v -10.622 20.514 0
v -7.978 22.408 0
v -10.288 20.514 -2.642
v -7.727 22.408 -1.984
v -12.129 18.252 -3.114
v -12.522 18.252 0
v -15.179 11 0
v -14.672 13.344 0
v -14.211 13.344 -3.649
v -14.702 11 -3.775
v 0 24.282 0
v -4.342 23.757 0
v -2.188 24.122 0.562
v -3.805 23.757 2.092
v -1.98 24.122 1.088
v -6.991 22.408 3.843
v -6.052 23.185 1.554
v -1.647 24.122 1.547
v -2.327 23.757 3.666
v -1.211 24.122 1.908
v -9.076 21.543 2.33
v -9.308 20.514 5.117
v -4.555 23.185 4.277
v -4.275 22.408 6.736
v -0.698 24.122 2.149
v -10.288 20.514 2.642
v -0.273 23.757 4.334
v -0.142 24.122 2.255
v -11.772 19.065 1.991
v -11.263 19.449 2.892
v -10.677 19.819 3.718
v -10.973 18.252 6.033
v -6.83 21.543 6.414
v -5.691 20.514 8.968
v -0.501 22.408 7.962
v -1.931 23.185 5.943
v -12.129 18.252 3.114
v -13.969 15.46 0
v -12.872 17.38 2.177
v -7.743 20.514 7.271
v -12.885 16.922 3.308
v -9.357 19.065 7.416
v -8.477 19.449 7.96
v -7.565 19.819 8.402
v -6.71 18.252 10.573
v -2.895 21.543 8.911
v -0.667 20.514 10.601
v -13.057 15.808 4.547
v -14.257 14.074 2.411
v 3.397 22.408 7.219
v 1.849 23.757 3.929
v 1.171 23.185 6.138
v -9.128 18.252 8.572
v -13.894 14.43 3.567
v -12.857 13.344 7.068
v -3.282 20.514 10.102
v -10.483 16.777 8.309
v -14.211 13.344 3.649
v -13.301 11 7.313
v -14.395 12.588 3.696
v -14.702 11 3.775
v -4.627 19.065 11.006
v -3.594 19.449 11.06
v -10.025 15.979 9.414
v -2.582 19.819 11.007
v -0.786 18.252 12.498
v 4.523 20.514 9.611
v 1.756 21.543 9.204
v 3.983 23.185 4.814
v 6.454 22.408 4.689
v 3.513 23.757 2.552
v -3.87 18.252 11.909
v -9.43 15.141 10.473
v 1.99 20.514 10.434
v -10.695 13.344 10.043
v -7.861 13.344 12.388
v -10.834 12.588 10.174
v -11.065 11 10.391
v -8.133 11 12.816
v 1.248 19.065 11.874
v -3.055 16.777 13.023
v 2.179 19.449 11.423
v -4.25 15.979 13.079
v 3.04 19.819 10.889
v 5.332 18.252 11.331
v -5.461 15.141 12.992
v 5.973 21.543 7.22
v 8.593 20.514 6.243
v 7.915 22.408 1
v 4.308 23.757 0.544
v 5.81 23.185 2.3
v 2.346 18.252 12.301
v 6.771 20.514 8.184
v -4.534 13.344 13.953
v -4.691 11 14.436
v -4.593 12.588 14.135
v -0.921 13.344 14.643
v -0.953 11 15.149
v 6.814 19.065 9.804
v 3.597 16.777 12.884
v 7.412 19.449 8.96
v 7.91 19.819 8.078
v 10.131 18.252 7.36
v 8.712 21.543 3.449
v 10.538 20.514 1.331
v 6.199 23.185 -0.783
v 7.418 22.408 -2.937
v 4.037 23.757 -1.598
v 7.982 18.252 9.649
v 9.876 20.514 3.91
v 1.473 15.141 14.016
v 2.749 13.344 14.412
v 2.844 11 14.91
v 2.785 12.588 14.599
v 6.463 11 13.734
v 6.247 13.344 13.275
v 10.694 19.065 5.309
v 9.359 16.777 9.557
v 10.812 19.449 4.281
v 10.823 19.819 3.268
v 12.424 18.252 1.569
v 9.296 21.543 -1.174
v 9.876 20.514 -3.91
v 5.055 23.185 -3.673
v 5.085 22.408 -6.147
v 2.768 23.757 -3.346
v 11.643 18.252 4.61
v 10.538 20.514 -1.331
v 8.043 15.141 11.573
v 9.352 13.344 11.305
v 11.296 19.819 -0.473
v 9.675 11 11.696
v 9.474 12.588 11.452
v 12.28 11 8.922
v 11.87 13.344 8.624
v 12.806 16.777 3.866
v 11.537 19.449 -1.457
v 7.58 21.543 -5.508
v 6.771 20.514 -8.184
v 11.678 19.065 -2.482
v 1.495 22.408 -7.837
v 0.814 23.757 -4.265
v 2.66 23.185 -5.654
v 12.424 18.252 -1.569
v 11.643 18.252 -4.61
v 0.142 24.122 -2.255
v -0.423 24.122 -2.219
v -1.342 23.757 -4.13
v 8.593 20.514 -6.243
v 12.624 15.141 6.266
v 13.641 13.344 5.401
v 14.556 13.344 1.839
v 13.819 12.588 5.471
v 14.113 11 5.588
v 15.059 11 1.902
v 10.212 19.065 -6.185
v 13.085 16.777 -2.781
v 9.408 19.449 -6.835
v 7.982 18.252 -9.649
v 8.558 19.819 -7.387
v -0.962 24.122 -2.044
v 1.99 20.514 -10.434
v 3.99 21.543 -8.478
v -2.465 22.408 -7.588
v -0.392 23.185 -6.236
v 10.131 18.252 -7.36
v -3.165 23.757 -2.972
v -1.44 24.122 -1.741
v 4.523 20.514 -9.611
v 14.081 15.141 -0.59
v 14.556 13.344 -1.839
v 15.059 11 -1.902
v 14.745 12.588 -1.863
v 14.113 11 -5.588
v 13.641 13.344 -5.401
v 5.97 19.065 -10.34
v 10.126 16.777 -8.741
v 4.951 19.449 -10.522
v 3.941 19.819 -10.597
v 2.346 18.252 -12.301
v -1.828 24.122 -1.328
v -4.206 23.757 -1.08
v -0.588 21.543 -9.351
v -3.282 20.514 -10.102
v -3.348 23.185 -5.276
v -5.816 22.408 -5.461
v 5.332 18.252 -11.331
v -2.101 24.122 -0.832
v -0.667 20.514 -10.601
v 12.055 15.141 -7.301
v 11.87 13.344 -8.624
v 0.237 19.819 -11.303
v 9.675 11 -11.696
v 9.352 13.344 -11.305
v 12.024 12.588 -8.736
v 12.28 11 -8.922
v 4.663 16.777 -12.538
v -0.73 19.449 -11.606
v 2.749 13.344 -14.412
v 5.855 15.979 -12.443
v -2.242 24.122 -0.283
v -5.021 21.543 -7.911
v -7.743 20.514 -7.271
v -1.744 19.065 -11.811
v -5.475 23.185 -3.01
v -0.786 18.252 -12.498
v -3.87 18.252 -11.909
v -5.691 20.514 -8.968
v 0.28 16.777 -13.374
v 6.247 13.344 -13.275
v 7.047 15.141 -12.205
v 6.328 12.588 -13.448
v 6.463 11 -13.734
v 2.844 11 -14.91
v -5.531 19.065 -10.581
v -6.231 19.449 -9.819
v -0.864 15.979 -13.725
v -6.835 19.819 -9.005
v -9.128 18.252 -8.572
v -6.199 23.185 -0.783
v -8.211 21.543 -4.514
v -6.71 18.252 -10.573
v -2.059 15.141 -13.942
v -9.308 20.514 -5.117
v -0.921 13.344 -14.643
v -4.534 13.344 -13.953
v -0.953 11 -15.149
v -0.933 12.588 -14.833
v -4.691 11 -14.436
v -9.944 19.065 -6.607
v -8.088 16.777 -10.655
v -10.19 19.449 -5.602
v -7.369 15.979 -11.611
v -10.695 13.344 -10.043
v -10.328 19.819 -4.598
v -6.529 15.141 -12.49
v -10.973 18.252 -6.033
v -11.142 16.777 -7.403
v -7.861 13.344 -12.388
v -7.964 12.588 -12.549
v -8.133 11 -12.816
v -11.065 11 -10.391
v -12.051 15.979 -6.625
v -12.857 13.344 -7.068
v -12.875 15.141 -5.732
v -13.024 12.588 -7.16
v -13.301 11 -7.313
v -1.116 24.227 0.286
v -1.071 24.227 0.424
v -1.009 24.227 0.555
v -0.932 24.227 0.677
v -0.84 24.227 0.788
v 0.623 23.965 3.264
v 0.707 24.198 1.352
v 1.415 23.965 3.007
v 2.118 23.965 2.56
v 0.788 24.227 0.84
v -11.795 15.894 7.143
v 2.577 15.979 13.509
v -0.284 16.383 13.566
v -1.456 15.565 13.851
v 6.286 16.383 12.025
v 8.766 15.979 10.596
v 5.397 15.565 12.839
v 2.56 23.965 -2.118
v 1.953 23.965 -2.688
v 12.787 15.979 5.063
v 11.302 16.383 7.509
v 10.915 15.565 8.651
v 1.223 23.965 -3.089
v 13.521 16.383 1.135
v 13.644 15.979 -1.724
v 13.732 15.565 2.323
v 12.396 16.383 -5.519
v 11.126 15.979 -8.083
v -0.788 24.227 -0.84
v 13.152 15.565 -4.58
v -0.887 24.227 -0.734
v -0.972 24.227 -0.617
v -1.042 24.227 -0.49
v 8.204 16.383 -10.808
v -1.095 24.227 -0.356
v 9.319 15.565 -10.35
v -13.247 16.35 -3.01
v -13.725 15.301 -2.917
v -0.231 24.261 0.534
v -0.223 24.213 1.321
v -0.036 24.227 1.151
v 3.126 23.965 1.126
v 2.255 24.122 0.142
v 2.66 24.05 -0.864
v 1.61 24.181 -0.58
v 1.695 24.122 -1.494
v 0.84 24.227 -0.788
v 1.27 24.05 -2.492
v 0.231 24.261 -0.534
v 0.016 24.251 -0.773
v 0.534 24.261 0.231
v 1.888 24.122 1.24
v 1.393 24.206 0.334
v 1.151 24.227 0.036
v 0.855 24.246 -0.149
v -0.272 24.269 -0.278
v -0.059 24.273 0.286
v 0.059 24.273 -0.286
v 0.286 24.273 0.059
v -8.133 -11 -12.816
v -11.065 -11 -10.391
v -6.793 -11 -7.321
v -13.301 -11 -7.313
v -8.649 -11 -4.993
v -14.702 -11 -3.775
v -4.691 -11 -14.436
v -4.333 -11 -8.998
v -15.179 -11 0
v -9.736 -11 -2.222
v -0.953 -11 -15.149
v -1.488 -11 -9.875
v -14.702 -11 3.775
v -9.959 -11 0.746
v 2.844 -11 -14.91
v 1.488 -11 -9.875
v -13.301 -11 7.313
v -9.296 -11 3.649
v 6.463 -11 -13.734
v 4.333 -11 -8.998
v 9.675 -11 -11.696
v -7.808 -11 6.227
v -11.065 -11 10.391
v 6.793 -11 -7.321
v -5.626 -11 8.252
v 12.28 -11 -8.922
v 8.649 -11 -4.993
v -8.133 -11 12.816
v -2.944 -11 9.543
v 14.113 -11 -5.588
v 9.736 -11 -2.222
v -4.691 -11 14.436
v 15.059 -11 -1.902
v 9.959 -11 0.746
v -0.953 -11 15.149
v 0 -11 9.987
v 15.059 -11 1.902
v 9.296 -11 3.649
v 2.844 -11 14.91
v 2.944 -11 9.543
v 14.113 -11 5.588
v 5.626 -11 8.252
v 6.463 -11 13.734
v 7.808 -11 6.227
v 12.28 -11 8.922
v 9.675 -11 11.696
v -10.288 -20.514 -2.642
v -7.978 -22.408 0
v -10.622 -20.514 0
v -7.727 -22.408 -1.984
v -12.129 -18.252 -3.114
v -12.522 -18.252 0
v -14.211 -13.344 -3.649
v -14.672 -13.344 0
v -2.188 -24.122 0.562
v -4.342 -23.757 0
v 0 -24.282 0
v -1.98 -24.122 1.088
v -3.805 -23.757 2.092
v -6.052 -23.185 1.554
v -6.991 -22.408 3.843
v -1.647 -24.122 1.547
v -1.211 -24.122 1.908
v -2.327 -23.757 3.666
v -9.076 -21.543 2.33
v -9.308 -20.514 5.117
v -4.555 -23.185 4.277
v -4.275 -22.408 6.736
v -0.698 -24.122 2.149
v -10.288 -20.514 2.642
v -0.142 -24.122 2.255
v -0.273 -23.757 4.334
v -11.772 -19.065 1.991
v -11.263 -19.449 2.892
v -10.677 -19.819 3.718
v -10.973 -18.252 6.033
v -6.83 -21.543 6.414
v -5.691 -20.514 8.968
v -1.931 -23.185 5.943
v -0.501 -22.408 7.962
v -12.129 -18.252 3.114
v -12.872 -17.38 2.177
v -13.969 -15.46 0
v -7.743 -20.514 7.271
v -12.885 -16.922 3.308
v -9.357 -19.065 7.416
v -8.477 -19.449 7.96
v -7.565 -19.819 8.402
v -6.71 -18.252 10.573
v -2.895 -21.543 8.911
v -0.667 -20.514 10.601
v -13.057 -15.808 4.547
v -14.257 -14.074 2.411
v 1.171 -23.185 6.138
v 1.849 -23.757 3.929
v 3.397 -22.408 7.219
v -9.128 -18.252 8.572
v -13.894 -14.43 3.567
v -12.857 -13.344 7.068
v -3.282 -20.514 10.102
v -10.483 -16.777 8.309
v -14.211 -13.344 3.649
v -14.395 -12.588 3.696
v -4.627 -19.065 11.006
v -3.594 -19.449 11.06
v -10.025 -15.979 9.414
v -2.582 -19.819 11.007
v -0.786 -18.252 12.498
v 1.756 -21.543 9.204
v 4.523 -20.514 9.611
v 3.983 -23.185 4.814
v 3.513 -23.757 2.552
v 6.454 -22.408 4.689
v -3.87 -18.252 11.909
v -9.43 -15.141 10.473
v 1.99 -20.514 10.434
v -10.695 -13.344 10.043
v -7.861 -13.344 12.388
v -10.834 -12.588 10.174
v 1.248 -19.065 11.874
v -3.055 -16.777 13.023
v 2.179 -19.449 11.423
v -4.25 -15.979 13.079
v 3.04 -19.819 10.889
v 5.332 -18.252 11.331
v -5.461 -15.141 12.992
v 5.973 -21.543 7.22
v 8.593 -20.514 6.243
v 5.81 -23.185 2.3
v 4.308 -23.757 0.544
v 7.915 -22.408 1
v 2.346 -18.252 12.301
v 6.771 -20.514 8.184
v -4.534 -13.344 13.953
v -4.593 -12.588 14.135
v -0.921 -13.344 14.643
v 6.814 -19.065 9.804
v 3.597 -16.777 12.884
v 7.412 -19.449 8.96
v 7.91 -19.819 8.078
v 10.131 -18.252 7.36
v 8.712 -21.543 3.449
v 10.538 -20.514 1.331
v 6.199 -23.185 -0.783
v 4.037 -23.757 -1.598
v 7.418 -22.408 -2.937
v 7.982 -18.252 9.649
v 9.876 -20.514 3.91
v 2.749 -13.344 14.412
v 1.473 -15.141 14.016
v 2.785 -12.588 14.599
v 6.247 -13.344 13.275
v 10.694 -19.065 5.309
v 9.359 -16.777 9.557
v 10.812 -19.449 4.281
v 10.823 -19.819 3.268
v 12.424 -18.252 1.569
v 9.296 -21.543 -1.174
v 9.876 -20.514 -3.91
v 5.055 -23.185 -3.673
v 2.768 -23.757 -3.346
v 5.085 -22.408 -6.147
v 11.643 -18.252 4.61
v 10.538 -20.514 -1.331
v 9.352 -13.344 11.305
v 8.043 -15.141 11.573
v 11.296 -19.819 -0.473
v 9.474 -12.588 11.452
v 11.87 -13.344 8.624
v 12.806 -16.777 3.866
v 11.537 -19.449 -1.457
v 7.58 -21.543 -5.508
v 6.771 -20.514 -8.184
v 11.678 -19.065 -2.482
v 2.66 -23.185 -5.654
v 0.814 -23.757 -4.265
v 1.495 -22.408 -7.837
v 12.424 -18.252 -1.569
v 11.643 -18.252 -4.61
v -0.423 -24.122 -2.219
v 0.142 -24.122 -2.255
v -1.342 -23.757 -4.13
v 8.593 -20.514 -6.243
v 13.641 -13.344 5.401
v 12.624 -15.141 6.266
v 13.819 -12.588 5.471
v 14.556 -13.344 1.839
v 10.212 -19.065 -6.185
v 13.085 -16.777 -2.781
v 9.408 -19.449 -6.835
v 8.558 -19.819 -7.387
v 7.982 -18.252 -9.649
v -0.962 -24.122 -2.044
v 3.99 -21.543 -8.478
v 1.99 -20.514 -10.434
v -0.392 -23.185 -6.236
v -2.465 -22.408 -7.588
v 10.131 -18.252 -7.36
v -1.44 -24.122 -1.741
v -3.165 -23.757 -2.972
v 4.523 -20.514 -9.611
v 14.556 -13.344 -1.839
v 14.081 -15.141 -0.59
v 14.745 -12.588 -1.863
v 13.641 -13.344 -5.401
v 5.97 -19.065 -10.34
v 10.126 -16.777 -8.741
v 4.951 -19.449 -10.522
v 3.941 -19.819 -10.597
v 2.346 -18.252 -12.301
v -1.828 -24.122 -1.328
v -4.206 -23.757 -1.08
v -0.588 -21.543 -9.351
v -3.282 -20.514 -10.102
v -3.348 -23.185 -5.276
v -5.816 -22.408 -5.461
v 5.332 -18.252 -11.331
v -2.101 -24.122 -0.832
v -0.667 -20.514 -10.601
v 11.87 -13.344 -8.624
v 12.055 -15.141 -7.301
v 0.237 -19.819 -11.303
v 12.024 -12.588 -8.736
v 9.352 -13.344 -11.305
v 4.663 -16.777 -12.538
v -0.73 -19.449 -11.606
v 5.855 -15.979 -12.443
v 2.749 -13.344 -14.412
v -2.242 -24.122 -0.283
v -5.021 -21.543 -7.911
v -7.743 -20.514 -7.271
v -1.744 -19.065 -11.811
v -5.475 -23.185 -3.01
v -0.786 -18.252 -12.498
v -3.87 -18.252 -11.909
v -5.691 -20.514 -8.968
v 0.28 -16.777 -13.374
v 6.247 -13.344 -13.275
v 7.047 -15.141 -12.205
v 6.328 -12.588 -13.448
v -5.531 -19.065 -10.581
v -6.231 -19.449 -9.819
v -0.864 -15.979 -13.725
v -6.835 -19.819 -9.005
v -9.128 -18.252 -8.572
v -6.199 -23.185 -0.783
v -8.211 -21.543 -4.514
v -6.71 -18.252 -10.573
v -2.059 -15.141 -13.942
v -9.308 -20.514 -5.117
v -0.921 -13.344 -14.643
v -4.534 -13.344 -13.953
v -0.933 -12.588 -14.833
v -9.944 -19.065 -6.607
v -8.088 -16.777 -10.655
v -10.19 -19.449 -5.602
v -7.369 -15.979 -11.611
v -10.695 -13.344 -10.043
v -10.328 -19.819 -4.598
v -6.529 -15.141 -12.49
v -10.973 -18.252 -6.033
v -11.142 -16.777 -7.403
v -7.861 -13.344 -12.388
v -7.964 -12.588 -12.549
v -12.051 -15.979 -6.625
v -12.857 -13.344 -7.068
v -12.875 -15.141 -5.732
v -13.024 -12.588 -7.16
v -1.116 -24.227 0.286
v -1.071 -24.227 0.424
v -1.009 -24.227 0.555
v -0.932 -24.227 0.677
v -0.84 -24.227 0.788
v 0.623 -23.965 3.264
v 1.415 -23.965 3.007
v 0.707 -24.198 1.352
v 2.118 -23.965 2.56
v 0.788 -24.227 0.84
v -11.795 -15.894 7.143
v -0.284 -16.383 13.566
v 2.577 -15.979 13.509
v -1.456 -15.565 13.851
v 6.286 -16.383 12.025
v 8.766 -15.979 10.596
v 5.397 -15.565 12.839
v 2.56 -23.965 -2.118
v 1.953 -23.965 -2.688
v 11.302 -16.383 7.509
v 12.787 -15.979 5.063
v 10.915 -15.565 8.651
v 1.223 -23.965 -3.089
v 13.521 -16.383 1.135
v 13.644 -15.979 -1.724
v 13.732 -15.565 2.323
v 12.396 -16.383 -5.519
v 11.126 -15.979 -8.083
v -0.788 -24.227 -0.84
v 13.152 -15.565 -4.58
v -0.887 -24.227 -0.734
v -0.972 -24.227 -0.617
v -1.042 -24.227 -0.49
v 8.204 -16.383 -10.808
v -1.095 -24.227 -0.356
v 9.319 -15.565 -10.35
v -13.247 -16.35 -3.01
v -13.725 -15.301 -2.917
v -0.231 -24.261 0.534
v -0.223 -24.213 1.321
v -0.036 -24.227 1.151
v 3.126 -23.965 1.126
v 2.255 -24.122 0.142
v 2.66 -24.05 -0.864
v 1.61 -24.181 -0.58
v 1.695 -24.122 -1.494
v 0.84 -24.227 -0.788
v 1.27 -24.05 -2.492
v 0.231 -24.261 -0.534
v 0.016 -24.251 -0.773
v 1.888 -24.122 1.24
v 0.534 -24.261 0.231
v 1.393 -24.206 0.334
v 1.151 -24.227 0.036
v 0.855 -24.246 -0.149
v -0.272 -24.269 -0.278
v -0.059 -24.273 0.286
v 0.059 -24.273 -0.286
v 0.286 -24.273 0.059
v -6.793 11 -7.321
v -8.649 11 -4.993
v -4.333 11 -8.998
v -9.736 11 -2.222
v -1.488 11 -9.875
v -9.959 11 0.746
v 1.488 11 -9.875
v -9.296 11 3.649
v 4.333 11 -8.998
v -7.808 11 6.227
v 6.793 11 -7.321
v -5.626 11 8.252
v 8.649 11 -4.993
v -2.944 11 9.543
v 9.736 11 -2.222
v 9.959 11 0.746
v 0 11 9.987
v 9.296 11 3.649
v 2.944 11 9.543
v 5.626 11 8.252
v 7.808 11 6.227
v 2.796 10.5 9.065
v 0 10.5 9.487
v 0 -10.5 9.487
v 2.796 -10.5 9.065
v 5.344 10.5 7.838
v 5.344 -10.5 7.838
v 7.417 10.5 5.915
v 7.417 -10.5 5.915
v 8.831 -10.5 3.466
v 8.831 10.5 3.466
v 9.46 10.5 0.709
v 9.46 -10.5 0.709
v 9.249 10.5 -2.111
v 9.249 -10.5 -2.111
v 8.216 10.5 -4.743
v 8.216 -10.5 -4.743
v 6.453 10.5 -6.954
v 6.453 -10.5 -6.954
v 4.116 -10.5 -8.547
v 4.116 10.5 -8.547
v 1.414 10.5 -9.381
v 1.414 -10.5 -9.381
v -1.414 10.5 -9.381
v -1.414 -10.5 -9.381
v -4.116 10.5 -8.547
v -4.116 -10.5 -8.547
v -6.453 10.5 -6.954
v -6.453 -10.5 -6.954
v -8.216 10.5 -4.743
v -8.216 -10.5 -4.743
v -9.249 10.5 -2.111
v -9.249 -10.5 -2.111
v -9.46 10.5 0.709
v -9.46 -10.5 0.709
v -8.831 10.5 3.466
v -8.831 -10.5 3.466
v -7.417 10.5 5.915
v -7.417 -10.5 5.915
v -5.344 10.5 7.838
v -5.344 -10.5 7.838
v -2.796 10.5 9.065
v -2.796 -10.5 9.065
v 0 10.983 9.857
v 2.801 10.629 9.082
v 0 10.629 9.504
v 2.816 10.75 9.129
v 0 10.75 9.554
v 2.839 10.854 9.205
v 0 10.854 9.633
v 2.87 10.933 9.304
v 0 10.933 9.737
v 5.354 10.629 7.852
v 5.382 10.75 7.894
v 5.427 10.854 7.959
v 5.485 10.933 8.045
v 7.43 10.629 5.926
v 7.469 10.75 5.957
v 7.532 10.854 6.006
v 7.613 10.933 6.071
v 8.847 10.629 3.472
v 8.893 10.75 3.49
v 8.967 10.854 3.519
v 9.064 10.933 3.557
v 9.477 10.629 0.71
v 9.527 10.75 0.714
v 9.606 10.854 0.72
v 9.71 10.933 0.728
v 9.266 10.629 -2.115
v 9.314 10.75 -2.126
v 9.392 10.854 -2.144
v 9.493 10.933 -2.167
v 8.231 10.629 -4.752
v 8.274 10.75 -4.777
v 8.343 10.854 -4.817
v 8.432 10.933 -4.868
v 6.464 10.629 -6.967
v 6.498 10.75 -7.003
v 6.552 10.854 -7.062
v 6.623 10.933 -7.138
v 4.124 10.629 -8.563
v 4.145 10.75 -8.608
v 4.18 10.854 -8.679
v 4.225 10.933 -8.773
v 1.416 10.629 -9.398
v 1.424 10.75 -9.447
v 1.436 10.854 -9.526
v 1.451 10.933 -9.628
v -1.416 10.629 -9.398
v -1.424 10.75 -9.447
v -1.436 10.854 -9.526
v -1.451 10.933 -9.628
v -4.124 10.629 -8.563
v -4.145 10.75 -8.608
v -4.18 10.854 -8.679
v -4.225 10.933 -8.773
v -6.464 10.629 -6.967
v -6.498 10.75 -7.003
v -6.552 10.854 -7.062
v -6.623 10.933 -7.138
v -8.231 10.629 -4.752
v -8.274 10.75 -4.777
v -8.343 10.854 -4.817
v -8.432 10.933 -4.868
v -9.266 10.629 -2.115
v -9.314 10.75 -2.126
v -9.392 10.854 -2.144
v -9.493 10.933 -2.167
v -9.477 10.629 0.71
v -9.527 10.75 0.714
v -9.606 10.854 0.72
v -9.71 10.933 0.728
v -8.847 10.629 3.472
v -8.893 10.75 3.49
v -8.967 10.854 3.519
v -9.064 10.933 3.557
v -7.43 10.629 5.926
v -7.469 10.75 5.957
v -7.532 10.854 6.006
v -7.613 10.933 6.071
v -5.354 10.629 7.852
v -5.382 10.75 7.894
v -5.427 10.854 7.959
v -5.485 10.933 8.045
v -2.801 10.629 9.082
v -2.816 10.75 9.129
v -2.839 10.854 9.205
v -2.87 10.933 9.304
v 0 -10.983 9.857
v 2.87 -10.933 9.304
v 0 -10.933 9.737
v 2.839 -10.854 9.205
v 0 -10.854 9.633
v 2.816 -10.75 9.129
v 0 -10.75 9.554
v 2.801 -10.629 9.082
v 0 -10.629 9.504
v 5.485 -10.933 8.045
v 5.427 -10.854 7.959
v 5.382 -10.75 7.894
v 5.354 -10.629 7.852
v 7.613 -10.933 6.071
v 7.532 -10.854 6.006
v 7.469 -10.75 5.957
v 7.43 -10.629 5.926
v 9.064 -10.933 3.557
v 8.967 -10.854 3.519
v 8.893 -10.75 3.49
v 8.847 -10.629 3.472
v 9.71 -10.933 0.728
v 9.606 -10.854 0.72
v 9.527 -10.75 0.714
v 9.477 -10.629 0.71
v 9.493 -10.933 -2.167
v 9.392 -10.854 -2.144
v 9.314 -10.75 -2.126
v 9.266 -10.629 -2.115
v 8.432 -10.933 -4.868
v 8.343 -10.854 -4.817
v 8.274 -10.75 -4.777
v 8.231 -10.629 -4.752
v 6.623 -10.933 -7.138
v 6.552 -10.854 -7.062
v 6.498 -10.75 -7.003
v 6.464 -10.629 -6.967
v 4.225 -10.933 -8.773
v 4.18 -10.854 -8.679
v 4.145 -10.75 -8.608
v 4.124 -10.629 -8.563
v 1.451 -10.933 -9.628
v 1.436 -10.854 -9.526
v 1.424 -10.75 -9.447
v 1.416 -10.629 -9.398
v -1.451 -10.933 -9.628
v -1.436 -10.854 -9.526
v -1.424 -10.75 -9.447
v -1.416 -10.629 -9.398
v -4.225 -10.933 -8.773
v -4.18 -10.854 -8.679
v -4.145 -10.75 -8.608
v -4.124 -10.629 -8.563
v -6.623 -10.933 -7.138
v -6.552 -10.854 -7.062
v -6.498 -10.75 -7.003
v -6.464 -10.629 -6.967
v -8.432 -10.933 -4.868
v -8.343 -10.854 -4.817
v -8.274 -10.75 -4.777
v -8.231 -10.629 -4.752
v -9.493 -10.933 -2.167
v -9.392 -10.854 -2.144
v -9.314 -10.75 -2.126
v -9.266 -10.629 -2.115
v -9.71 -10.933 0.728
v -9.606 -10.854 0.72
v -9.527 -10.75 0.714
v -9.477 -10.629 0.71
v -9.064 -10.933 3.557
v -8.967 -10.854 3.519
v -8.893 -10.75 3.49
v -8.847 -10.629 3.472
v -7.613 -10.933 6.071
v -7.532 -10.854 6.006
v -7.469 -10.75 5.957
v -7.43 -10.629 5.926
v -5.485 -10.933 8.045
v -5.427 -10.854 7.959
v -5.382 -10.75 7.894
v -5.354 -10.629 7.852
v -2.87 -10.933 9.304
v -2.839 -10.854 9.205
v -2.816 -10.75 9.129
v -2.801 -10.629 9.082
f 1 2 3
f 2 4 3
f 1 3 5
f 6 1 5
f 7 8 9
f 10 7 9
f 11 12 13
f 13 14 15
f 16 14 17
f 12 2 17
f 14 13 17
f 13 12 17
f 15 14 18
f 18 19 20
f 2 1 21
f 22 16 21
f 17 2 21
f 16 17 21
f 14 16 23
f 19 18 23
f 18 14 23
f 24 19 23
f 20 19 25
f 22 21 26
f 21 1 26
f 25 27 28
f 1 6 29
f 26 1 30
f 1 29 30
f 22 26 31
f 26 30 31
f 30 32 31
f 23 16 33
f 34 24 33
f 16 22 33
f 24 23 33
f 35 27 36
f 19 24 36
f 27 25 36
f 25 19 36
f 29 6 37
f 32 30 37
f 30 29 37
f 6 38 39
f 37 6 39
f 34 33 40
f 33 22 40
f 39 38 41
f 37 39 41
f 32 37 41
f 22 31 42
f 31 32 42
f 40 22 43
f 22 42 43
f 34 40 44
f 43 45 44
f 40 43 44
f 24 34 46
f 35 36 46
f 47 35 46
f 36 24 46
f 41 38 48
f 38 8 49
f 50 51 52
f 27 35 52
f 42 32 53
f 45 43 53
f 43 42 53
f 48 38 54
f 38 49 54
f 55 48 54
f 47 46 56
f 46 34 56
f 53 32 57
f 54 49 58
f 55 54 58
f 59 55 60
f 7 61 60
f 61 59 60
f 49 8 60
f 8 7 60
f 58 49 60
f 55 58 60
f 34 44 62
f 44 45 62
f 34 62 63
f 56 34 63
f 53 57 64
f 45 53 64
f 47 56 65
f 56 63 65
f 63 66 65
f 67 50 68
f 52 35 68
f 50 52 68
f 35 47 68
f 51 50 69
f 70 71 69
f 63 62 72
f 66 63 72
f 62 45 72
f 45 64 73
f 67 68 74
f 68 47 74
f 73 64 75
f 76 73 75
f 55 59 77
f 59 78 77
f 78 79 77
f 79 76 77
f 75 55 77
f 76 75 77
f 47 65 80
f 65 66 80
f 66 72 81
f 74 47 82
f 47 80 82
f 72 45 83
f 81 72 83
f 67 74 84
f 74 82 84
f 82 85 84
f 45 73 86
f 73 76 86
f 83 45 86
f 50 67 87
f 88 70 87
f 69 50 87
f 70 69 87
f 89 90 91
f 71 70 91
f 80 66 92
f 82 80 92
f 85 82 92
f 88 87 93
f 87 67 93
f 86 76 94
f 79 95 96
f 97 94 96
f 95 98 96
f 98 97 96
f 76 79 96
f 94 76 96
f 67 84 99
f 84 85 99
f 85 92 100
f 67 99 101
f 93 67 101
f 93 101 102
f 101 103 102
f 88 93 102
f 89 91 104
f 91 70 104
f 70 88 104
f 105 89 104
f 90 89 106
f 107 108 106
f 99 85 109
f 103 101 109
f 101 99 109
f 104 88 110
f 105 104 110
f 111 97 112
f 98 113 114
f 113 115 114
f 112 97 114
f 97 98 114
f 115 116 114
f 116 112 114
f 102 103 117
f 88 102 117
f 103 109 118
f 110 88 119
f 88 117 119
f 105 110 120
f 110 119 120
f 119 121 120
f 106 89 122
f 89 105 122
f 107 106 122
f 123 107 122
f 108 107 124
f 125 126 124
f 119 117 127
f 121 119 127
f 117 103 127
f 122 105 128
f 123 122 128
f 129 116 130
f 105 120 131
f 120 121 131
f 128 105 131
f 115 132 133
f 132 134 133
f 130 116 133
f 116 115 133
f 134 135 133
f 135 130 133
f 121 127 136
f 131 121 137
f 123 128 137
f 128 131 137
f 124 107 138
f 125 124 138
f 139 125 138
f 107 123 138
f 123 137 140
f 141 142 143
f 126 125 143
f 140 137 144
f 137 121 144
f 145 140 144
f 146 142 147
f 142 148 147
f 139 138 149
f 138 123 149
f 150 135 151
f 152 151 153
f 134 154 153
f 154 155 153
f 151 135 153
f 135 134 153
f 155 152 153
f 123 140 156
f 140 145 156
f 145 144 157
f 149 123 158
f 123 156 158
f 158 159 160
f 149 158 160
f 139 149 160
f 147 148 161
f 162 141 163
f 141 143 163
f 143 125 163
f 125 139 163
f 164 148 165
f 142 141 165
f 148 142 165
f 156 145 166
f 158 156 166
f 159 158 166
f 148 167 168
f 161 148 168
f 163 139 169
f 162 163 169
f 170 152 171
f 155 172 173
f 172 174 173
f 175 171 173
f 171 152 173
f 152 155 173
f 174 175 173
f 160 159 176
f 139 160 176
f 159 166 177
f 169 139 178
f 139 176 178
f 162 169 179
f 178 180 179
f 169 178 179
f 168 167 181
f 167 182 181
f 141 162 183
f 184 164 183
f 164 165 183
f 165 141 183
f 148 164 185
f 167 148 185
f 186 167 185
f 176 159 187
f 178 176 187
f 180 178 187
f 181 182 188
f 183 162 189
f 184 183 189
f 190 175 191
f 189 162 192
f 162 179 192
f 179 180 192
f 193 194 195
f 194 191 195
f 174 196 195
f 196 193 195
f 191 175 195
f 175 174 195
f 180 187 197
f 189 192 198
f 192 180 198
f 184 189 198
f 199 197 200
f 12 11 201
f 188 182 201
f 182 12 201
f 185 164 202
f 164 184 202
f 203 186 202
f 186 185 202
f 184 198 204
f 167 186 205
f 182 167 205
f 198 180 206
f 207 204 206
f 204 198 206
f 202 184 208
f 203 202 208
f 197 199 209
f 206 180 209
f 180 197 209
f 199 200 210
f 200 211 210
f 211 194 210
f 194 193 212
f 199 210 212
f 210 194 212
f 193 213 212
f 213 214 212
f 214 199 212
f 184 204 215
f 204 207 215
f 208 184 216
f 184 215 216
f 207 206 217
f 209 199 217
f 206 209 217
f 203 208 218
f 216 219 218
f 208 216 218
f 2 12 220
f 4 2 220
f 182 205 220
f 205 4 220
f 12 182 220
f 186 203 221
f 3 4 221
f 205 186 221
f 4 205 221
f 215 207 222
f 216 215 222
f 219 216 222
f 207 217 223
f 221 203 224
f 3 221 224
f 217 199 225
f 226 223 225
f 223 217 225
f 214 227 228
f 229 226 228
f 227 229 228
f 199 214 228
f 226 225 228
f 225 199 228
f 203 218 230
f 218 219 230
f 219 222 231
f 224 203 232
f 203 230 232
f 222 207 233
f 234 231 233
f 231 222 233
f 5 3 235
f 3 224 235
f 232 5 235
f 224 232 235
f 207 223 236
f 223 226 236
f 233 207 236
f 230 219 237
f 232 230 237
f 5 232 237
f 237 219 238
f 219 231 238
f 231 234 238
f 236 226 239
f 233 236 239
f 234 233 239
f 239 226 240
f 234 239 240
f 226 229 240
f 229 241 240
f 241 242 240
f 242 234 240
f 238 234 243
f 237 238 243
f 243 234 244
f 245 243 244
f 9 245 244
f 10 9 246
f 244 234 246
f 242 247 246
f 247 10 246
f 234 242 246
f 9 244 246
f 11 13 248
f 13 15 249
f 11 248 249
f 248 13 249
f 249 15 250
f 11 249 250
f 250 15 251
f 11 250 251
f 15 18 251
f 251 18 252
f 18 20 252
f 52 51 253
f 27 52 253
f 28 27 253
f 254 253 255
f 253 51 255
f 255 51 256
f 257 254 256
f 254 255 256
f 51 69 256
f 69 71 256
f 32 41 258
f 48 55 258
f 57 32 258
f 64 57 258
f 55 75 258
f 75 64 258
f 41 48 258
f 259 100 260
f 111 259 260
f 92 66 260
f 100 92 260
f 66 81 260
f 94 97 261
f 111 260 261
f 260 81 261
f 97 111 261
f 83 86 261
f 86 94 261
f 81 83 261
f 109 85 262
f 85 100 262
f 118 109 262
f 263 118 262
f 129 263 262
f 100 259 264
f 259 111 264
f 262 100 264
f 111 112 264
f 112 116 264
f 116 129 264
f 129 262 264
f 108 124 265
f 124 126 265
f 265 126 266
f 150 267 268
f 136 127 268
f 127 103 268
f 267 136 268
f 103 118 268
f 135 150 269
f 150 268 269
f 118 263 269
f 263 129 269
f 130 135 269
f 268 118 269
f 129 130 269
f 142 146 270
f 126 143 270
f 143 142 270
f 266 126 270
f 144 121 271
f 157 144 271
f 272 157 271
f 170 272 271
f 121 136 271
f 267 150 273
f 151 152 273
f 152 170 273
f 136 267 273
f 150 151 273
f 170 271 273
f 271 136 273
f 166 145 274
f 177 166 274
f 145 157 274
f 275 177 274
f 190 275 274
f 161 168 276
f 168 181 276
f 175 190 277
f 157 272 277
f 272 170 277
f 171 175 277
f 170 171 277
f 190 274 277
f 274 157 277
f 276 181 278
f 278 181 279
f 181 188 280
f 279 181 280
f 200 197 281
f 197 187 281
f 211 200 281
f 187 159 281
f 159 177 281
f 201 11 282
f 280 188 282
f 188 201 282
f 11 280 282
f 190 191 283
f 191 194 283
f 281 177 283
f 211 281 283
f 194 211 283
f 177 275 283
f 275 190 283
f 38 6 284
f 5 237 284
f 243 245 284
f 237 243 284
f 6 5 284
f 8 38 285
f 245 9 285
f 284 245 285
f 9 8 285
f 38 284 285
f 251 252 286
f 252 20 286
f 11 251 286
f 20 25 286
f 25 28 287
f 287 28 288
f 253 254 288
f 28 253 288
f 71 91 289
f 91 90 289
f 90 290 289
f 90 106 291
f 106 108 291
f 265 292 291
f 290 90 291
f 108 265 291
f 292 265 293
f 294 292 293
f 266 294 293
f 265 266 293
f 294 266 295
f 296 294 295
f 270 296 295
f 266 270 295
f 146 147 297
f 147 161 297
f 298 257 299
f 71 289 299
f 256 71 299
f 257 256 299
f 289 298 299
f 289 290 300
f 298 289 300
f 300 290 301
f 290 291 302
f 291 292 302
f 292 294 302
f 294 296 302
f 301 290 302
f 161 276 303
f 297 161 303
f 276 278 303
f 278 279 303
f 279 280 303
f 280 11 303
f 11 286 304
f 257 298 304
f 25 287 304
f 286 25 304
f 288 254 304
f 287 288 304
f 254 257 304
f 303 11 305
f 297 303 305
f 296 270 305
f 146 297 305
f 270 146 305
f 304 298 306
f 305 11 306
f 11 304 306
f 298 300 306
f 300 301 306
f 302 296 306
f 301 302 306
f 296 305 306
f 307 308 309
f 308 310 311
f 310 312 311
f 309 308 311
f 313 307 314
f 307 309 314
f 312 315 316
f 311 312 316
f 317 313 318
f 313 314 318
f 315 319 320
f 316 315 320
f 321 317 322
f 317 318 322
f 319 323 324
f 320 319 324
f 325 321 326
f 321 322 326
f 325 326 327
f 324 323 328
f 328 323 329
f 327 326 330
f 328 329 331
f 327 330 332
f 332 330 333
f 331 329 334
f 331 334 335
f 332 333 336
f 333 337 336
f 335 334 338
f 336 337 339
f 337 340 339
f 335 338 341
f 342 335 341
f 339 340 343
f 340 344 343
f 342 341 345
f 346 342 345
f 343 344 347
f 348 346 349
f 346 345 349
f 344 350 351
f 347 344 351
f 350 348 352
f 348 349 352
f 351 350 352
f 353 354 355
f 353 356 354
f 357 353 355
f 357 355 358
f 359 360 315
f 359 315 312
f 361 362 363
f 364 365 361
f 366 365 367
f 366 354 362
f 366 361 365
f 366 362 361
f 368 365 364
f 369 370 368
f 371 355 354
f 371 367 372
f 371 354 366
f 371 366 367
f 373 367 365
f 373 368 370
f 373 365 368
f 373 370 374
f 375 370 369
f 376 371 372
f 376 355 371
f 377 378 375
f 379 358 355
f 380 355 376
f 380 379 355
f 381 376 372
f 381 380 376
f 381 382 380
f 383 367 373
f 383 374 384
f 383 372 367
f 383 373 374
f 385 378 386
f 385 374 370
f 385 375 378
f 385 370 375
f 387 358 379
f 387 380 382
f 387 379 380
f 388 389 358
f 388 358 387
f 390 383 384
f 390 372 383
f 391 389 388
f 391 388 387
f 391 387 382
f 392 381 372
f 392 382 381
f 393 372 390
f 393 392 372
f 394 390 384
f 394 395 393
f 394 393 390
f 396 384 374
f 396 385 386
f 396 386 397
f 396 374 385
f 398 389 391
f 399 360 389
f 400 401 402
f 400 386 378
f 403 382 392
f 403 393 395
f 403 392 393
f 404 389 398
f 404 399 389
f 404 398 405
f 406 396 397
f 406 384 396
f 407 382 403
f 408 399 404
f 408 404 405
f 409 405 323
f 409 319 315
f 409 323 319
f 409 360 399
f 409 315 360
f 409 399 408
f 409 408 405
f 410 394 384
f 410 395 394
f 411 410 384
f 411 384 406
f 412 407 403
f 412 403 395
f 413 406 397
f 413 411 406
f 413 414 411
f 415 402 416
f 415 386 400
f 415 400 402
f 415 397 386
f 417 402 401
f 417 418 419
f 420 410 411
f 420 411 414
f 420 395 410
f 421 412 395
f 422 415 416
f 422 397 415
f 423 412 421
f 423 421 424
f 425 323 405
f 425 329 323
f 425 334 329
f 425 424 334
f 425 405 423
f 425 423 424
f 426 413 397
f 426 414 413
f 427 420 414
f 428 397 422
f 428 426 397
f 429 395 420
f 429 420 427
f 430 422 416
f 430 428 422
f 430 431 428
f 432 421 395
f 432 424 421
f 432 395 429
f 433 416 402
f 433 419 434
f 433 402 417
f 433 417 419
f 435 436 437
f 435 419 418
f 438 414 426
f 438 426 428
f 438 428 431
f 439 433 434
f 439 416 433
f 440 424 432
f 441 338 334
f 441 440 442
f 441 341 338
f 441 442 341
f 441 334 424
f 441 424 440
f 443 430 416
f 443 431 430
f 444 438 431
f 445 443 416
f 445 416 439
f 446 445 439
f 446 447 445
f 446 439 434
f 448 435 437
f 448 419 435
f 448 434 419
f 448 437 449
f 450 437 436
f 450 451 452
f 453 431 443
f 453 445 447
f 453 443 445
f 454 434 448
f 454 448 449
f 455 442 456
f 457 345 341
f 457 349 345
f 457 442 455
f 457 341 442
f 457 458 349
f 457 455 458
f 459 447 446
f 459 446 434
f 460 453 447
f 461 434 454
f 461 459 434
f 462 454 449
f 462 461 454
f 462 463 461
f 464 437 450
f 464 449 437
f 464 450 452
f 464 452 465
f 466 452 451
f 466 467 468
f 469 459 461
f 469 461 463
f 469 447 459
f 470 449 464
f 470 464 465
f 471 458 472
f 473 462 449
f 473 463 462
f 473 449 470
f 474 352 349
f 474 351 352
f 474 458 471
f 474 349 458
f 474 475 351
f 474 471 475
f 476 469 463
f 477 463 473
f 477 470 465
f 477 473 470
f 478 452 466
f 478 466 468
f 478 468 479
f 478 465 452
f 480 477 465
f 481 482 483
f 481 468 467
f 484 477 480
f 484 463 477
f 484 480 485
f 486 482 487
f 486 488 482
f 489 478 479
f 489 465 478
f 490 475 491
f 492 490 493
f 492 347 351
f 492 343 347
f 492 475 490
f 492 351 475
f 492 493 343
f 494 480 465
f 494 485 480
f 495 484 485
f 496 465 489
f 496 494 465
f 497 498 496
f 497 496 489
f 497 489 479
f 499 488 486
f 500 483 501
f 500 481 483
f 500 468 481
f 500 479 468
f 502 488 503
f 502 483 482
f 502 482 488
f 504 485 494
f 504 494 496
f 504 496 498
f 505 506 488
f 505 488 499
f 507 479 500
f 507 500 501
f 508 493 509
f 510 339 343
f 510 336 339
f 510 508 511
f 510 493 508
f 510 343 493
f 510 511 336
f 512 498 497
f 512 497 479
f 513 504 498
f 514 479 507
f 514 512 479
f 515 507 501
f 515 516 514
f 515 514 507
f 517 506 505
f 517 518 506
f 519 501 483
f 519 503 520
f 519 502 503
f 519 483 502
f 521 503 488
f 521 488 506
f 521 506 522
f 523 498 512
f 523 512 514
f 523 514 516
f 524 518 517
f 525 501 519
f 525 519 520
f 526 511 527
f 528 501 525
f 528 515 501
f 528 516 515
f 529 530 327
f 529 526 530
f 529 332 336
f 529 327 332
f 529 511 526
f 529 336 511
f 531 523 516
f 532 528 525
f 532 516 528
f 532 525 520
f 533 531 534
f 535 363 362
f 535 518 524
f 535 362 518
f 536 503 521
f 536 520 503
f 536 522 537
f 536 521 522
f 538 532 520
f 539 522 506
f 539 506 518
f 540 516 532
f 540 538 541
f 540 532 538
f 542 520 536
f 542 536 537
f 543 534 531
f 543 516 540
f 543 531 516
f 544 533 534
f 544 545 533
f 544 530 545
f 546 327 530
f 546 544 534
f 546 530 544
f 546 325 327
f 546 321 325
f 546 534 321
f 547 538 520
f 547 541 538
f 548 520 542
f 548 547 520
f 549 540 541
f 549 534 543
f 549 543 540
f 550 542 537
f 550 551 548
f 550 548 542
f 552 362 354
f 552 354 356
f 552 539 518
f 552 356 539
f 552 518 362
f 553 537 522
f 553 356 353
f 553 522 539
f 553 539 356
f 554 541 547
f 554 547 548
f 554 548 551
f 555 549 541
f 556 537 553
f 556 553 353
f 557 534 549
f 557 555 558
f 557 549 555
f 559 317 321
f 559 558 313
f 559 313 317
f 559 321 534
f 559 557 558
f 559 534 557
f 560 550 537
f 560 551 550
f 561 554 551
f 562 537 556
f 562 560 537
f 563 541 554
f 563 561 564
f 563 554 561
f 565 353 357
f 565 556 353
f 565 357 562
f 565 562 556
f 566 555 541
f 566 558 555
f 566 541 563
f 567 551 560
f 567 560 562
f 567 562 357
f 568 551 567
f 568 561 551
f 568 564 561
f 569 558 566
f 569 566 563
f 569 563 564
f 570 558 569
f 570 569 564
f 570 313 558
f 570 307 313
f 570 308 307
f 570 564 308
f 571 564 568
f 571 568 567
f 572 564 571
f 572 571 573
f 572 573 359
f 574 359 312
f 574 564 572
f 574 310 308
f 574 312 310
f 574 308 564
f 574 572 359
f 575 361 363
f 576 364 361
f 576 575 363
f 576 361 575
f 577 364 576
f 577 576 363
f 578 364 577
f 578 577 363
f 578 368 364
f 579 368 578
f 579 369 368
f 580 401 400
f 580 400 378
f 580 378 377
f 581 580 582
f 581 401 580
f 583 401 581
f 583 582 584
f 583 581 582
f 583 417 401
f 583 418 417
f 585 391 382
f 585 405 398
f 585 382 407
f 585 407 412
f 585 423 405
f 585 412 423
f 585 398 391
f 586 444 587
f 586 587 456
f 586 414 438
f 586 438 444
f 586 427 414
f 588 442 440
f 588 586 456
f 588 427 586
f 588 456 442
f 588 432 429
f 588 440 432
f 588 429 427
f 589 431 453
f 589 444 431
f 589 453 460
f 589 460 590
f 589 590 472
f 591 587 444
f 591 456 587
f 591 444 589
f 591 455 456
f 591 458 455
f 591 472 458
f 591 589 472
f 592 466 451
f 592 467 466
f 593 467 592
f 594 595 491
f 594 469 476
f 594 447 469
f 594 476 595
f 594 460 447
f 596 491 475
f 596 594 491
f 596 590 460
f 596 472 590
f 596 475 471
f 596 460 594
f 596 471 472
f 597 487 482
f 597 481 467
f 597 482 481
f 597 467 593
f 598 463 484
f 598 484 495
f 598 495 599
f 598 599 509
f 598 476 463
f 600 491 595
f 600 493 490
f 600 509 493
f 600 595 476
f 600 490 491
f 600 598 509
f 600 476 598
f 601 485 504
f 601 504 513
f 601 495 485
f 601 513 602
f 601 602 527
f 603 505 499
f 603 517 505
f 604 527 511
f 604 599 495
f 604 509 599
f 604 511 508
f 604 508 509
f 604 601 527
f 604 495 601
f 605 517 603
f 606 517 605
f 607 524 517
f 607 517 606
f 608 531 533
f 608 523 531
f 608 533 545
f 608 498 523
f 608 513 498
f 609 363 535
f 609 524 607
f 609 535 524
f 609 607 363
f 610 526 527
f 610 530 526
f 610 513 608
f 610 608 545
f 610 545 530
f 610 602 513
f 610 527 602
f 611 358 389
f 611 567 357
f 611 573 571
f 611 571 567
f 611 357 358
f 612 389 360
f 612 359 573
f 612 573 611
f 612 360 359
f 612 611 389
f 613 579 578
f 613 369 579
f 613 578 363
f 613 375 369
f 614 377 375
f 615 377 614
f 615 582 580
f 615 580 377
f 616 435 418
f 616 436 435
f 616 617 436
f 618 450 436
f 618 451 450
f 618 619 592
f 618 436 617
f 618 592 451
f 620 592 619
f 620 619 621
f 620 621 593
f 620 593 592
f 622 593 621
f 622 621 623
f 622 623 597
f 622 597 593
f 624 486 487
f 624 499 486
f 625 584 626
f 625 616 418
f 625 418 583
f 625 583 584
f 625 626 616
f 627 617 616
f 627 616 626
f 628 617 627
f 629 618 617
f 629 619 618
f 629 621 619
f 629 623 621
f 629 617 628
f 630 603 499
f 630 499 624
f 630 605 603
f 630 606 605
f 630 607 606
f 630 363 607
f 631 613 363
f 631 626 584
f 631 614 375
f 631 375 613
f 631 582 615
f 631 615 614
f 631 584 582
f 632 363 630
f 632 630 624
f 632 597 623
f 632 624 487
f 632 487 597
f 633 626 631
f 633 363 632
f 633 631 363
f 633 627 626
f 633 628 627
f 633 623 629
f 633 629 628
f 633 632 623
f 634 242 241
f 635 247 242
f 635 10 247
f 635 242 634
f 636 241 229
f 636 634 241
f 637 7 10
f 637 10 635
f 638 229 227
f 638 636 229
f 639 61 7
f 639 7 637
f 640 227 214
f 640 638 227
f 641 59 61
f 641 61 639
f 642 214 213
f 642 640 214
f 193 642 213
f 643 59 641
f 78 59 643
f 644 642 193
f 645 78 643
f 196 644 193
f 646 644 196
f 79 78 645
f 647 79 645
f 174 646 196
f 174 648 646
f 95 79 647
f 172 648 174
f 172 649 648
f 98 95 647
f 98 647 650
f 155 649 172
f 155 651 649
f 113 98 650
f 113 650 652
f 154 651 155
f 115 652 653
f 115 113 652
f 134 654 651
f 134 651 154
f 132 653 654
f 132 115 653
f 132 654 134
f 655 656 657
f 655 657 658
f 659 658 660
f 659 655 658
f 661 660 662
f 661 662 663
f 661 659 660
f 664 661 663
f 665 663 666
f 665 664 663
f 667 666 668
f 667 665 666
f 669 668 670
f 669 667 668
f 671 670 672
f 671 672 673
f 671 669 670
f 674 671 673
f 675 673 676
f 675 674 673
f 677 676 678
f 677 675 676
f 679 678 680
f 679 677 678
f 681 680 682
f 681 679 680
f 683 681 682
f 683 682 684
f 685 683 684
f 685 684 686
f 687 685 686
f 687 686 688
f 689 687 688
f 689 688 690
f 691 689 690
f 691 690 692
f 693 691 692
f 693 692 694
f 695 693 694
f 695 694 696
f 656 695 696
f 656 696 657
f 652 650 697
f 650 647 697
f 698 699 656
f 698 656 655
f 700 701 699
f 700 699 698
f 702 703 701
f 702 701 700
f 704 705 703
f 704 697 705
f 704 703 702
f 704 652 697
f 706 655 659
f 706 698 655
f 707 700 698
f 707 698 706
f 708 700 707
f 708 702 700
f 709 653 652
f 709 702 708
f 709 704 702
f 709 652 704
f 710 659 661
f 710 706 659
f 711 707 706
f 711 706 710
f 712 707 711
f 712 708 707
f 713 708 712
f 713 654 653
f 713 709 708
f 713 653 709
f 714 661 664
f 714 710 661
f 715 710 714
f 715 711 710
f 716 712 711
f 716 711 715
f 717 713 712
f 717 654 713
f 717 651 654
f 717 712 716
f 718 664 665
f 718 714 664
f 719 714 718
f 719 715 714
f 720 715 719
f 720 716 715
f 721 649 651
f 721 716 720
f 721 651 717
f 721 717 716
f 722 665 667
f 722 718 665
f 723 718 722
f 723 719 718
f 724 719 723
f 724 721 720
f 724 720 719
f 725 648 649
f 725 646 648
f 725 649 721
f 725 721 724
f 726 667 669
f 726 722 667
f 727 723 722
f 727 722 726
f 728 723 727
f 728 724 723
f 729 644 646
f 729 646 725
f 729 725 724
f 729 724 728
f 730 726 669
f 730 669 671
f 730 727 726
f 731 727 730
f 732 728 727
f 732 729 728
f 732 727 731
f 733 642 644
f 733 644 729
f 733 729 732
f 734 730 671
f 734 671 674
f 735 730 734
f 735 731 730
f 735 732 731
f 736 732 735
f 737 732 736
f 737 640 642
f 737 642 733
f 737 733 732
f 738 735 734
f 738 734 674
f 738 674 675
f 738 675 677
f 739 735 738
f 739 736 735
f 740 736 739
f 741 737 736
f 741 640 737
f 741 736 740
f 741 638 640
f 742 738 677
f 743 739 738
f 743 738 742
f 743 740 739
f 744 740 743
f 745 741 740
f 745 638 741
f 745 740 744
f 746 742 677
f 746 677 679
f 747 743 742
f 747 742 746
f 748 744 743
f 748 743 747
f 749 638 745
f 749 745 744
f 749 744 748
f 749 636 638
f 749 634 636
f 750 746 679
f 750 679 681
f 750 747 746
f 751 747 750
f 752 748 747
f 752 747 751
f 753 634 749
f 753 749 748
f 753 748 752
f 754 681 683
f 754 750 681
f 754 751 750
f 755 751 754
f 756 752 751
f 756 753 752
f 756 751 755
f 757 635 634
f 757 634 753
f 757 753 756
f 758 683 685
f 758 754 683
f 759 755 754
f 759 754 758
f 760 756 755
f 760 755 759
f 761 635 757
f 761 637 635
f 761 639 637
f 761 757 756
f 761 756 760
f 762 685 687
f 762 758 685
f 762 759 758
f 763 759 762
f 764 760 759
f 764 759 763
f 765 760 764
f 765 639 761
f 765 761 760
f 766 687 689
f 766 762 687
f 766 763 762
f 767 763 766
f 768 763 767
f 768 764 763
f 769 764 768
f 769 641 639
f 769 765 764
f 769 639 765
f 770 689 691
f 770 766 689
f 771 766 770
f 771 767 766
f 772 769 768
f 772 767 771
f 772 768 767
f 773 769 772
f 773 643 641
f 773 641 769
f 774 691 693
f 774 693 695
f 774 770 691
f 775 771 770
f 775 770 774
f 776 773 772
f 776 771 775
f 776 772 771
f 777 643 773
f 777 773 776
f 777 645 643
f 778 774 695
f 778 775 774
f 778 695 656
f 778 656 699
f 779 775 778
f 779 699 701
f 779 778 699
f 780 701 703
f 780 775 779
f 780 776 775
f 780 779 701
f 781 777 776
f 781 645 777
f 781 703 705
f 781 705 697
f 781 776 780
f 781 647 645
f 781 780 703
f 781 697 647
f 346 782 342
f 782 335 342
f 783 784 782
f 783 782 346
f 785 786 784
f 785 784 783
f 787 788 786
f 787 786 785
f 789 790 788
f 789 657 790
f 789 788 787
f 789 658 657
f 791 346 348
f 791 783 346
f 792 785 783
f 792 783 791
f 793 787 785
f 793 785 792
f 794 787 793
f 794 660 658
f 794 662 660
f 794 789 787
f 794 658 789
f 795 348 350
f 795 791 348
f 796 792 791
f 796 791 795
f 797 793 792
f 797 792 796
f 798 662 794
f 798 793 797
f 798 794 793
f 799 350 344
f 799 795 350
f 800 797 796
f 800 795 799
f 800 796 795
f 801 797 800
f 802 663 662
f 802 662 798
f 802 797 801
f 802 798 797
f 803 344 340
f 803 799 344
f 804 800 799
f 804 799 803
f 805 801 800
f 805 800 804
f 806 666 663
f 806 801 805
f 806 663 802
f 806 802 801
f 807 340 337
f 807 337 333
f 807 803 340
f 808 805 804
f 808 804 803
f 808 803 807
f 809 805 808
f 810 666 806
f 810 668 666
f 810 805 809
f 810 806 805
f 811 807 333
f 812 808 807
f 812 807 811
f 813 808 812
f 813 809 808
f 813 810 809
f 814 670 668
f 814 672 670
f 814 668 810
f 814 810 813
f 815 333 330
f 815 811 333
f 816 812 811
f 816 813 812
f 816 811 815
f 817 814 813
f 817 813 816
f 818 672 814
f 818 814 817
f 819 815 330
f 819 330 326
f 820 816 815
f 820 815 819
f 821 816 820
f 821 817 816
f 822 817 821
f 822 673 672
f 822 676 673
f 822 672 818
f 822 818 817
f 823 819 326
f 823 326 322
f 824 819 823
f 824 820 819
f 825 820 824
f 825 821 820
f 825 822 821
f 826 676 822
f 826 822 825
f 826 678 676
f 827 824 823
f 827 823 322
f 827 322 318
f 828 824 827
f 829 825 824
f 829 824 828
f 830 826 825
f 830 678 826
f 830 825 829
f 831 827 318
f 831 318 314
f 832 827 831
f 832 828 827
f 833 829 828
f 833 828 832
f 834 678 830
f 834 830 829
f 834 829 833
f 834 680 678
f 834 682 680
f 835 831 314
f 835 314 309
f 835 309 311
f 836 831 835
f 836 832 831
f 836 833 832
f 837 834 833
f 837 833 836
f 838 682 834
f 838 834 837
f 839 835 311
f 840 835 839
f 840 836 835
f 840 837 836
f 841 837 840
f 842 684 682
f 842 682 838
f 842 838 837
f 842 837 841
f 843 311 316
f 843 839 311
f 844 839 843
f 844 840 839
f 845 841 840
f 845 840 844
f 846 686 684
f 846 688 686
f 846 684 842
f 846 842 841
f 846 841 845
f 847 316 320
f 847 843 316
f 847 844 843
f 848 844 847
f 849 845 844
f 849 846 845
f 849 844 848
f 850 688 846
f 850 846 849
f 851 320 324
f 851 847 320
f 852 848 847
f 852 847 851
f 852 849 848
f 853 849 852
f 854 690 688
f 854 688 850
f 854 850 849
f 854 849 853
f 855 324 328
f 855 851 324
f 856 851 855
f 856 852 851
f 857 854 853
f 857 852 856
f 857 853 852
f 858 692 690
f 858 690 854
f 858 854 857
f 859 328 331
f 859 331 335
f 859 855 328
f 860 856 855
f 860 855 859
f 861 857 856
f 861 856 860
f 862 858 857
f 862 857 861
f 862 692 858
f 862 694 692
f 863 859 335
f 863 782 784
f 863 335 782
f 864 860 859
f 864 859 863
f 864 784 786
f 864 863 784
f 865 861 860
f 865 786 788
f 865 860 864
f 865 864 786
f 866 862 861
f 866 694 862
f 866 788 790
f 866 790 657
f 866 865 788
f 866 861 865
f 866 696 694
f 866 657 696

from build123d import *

# Parameters (mm, degrees)
SKETCH1_R           = 9.486832981
BOSS_EXTRUDE1_DEPTH = 11
FILLET1_R           = 0.5


with BuildPart() as part:
    # Sketch1 → Boss-Extrude1 (new body)
    with BuildSketch(Plane(origin=(0, 0, 0), x_dir=(1, 0, 0), z_dir=(0, 1, 0))):
        with Locations(Location((0, 0, 0), (0, 0, 270))):
            Circle(SKETCH1_R)
    boss_extrude1 = extrude(amount=BOSS_EXTRUDE1_DEPTH)

    # Sketch2 → Revolve1 (revolve)
    with BuildSketch(Plane.XY):
        with BuildLine():
            Line((0, 24.281566173), (0, 11))
            Line((0, 11), (-15.178932769, 11))
            add(Edge.make_bspline(
                [(0, 24.281566173), (-13.015575695, 23.967255227), (-15.178932769, 11)],
                knots=[0, 0, 0, 1, 1, 1], degree=2))
        make_face()
    revolve1 = revolve(axis=Axis((0, 0, 0), (0, 1, 0)))

    # Mirror1: Boss-Extrude1, Revolve1 across plane
    add(boss_extrude1.mirror(Plane.ZX))
    add(revolve1.mirror(Plane.ZX))

    # Fillet1
    fillet1_edges = [part.edges().sort_by_distance(p)[0] for p in [
        (0, -11, -9.486832981),
        (0, 11, -9.486832981),
    ]]
    fillet(fillet1_edges, radius=FILLET1_R)


solid = part.part
